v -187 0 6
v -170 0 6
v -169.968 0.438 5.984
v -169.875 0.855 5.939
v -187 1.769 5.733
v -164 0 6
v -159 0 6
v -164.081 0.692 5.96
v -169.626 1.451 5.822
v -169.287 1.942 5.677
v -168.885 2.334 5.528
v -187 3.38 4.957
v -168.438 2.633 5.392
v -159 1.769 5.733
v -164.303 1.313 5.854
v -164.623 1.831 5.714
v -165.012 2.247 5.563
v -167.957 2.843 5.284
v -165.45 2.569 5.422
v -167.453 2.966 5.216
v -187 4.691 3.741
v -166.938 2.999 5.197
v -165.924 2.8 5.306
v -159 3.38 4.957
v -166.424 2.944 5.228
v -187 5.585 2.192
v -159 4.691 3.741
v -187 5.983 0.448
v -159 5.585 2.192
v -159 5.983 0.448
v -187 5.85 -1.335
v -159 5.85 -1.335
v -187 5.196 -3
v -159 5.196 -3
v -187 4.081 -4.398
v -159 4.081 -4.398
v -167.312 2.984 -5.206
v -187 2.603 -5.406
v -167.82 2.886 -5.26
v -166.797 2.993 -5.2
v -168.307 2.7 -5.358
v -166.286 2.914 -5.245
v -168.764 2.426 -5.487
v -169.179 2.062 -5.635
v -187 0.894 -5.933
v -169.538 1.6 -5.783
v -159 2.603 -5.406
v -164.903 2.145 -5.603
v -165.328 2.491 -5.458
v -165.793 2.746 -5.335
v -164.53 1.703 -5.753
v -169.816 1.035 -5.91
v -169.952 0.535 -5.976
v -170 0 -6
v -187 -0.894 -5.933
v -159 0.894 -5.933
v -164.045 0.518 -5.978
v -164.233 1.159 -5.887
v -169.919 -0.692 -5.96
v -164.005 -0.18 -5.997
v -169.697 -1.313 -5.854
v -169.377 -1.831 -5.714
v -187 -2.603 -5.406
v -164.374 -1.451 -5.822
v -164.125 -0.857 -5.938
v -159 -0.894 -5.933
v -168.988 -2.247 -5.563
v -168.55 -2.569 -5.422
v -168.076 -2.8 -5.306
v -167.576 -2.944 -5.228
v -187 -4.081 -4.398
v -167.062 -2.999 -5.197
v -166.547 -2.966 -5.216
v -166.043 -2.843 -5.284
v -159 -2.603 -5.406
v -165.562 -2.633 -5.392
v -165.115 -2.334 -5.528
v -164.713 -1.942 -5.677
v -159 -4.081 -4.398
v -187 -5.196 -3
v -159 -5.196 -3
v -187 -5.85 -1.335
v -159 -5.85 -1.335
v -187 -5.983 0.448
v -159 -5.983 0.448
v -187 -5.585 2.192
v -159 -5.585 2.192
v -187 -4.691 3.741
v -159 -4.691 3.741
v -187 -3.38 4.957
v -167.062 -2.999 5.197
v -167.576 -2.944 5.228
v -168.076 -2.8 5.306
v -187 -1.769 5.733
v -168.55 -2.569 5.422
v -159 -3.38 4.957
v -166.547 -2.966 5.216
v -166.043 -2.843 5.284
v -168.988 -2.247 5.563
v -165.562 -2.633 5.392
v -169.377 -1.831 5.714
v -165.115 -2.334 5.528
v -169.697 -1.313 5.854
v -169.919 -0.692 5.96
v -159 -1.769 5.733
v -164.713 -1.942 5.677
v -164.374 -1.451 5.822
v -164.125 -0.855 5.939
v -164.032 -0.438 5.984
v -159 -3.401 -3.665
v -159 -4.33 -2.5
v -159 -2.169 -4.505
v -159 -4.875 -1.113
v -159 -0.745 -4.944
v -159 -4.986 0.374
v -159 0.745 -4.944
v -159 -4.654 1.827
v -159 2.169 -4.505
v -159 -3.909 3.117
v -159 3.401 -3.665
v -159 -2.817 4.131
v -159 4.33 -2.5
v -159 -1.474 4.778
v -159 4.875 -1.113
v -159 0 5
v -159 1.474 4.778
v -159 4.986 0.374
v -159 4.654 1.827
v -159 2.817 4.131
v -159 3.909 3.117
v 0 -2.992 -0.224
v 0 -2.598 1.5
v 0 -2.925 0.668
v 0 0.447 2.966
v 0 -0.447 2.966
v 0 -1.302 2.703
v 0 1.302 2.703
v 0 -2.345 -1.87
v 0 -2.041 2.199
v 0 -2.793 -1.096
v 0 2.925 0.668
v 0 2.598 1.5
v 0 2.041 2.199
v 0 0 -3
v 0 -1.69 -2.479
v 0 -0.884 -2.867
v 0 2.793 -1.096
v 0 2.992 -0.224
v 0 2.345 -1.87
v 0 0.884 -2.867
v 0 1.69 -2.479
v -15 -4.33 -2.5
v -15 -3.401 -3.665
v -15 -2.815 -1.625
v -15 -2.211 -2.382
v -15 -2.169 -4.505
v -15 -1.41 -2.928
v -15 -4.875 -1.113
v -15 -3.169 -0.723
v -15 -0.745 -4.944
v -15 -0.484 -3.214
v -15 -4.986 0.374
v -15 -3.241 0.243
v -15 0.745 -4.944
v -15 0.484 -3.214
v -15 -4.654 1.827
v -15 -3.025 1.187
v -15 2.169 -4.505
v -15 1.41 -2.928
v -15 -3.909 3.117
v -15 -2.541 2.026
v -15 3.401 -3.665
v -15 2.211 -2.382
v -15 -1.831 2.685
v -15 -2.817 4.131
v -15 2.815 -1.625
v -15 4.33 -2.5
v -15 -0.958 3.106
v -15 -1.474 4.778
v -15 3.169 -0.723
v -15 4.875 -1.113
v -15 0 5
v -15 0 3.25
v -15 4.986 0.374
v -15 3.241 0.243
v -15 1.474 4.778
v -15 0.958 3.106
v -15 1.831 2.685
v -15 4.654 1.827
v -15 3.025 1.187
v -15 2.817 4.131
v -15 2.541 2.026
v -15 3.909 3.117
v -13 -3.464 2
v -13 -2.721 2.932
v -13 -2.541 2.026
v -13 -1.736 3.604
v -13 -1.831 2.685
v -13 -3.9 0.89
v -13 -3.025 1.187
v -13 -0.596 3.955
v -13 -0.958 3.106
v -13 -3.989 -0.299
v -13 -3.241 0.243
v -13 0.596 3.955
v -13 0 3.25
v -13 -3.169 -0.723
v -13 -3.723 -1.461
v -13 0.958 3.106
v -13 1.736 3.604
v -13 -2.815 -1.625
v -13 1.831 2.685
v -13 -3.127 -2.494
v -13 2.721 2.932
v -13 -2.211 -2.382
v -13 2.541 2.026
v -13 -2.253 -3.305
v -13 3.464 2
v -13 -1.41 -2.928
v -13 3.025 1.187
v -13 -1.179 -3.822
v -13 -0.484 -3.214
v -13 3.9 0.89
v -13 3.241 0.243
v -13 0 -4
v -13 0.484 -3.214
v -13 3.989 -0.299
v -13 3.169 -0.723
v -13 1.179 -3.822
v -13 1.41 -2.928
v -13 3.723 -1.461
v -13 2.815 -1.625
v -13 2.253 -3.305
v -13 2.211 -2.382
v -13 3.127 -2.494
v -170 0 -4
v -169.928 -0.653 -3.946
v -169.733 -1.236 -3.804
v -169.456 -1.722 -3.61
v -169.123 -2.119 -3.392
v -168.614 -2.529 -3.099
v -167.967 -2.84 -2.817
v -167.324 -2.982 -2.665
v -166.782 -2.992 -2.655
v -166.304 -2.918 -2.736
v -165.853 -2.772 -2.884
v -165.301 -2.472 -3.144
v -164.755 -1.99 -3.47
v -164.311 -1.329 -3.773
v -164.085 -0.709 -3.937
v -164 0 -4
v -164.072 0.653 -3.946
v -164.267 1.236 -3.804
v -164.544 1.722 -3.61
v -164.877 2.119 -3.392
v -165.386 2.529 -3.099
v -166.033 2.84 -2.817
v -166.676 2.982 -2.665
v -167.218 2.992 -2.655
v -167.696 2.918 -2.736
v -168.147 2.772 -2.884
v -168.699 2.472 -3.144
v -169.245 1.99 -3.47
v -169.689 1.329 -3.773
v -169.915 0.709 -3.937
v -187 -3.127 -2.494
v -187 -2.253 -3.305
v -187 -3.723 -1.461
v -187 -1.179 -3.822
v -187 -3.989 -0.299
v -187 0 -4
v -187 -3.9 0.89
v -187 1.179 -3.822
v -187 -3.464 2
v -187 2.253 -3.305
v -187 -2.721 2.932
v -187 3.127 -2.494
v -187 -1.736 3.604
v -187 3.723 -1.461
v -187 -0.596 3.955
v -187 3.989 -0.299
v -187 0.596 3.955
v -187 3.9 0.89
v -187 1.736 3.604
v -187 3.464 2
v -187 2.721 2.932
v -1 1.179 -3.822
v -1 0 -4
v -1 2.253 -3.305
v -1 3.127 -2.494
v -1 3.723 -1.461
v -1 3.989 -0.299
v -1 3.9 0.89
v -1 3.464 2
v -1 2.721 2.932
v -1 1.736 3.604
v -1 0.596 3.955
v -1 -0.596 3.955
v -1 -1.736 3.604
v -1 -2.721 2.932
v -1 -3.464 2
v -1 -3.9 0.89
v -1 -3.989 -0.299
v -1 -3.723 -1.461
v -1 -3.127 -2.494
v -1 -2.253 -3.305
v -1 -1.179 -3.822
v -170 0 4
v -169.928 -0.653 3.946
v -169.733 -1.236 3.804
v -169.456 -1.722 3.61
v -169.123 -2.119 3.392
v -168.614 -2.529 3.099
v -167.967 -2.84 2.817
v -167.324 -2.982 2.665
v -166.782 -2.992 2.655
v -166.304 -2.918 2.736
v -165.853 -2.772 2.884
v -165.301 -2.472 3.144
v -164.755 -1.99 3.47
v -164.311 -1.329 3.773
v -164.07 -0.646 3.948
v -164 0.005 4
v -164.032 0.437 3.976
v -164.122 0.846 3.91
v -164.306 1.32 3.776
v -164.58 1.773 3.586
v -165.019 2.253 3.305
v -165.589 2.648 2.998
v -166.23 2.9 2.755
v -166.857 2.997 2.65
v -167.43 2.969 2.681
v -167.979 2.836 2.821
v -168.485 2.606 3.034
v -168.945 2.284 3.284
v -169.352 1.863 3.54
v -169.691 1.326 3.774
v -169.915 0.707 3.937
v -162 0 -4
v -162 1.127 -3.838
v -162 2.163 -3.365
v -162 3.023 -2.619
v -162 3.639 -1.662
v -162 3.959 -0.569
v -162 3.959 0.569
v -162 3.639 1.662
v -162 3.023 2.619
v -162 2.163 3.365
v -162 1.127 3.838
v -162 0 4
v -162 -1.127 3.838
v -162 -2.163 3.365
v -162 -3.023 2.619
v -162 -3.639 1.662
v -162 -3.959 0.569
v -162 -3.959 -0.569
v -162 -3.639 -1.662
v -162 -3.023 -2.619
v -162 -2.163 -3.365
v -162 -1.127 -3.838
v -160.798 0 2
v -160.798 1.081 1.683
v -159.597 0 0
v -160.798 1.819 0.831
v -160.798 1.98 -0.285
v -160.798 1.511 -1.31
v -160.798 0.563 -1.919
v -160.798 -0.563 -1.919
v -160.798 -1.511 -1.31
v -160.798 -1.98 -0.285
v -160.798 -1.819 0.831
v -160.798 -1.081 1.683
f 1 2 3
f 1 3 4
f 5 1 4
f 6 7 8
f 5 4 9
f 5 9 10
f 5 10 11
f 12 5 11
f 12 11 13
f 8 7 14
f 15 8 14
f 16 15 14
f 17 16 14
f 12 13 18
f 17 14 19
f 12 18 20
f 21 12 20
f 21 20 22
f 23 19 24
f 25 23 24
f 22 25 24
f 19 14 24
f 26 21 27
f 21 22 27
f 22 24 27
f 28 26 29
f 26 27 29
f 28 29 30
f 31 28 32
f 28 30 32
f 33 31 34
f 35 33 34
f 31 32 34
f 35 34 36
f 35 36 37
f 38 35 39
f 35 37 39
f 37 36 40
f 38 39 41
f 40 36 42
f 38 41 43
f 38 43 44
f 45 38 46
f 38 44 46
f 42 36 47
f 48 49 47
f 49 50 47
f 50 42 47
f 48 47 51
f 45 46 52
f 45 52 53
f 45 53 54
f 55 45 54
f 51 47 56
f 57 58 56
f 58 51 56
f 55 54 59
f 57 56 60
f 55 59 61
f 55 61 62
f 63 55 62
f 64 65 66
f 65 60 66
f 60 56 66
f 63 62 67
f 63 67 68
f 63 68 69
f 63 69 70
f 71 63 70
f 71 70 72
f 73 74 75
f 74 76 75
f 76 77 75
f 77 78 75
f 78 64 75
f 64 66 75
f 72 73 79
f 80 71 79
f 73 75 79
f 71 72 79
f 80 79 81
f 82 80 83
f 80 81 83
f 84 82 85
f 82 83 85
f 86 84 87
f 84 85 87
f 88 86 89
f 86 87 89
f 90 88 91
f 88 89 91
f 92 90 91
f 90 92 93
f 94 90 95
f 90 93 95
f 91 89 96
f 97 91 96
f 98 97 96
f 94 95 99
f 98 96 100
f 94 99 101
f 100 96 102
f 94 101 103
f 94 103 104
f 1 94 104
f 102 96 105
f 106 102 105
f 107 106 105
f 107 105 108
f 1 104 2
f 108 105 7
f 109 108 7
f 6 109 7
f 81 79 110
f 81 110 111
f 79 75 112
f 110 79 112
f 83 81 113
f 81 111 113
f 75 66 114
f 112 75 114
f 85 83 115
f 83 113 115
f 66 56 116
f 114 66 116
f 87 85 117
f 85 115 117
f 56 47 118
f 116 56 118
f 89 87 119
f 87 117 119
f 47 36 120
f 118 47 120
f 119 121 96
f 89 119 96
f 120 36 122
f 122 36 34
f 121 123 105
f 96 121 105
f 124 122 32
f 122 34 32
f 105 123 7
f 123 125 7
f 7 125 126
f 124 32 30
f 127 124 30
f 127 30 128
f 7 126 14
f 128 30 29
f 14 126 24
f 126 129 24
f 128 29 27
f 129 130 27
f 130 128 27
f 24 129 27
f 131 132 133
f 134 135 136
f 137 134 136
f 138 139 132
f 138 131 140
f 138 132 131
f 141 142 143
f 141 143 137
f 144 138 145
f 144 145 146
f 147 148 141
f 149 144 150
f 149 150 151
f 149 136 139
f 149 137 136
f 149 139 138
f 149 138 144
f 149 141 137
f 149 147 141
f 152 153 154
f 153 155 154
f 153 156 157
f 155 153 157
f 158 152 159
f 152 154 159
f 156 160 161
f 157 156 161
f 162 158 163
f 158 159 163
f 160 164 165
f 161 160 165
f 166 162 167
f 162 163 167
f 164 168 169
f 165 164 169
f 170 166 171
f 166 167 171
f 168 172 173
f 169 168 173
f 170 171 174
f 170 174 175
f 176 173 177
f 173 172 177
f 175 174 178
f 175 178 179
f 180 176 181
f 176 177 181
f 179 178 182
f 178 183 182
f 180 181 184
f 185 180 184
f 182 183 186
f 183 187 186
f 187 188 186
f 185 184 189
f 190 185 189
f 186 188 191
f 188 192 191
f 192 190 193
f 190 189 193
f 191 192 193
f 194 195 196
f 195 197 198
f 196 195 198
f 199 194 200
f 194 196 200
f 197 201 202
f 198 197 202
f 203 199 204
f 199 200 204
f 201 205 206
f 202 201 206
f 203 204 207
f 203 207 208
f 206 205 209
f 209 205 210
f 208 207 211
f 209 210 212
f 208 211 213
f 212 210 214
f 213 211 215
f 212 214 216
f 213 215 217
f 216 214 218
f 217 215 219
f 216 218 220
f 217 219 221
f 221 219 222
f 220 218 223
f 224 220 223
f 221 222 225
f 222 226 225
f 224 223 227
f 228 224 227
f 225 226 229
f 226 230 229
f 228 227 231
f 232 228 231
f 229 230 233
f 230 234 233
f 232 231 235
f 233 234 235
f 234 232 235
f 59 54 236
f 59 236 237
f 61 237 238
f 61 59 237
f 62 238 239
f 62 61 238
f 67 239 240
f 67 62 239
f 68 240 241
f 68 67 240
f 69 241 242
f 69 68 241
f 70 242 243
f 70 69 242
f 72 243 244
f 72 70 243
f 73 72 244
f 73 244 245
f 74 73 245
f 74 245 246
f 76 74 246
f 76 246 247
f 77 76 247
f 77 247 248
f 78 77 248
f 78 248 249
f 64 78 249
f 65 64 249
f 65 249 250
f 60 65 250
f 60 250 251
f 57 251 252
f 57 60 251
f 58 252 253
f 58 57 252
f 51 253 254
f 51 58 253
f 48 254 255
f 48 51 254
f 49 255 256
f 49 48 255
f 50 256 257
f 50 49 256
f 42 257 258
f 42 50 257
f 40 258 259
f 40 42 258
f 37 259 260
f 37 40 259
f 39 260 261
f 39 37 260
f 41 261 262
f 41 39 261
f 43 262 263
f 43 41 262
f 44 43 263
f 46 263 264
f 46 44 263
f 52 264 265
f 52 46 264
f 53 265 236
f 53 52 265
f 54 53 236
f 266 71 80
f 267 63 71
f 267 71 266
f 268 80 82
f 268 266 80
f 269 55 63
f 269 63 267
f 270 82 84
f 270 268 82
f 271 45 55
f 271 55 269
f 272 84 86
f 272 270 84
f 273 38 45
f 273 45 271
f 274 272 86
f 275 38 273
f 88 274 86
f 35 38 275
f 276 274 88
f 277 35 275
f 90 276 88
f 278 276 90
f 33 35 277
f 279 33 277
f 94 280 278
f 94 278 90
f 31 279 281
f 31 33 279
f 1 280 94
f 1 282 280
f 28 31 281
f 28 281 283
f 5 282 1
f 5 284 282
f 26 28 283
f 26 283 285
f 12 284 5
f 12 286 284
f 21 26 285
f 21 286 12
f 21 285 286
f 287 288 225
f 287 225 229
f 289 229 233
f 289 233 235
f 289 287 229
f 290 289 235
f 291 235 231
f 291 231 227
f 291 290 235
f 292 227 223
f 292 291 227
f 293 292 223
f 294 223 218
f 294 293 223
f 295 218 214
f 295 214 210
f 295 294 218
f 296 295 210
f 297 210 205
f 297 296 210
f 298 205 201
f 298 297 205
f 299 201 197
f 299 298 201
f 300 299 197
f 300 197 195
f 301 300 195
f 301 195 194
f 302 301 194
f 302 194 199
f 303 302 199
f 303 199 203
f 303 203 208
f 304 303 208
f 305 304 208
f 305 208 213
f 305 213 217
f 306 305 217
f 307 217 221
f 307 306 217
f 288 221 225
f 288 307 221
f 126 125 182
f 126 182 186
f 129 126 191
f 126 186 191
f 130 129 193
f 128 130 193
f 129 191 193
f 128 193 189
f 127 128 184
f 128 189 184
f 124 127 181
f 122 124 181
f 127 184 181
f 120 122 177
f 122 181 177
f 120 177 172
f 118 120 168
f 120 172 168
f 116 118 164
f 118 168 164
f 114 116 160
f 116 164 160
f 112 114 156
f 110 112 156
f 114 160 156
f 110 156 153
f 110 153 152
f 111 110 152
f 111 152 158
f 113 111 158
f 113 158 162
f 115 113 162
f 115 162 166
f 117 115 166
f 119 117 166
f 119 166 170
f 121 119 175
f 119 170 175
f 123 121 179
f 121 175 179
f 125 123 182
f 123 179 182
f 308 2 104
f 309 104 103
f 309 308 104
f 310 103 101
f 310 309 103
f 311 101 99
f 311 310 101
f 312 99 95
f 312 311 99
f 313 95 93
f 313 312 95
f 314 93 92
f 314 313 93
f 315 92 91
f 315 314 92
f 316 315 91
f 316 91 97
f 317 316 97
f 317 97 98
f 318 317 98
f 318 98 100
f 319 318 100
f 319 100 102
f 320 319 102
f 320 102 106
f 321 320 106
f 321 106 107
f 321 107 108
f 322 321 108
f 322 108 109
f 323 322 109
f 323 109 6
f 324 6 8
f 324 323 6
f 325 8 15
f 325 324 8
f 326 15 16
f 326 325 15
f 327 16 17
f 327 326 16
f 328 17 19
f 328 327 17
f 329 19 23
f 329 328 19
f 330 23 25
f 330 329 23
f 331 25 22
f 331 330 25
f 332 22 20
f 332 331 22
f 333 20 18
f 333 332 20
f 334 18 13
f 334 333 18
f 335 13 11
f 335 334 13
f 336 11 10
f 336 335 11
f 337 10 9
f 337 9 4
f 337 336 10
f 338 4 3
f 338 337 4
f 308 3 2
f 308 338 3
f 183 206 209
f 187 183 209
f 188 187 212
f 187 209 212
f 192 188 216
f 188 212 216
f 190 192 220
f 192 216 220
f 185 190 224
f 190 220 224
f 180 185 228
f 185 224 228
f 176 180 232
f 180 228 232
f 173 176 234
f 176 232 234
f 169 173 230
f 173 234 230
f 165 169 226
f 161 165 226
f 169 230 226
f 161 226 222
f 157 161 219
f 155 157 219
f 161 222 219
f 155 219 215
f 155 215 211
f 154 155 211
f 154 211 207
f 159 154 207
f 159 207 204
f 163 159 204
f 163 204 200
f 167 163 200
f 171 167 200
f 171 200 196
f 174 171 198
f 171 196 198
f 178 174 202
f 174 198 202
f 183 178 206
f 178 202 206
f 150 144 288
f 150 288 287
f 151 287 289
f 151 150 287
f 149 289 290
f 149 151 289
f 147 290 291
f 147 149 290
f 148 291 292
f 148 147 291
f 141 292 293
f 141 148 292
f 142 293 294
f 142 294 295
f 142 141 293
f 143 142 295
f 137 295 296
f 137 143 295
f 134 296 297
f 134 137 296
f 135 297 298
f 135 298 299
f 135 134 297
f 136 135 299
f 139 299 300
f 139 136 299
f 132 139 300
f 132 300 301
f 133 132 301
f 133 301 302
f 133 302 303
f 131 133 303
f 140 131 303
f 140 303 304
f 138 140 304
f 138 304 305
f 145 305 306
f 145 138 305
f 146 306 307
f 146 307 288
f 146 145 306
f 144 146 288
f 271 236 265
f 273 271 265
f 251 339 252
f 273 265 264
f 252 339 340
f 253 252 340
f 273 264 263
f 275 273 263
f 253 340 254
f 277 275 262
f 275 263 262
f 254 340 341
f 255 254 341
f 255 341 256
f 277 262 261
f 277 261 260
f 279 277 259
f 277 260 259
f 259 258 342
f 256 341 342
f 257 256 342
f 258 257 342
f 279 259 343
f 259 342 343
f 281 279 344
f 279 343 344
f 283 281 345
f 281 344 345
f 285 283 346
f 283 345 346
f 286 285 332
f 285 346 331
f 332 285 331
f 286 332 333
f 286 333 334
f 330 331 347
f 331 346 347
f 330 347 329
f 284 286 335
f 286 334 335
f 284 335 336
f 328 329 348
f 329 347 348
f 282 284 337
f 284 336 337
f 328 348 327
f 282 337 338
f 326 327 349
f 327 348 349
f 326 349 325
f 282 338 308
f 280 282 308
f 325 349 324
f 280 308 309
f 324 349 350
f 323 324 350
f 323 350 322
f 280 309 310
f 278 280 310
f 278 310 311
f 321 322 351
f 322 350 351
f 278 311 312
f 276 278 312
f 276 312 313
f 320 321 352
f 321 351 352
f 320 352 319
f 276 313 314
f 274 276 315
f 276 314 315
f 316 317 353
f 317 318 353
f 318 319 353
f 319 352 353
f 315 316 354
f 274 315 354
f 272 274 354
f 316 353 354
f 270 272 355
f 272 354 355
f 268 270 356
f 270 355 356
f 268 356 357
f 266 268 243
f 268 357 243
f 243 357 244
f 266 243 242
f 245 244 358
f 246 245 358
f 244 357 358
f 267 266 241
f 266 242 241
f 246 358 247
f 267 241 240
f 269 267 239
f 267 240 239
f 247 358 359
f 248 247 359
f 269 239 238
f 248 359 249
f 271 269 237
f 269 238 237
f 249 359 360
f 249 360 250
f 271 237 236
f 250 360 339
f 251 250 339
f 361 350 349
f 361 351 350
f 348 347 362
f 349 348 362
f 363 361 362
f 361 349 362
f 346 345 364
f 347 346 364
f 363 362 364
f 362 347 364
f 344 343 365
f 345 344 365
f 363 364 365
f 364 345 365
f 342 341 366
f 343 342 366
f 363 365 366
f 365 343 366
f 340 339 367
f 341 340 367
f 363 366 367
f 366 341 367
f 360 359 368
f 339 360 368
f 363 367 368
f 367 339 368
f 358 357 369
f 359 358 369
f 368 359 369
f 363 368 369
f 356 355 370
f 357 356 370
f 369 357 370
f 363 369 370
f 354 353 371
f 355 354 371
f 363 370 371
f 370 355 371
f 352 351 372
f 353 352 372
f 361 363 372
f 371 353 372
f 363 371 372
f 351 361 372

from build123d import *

# Parameters (mm, degrees)
SKETCH_3_R               = 4
EXTRUDE_1_DEPTH          = 13
SKETCH_5_R               = 3.25
EXTRUDE_2_DEPTH          = 2
SKETCH_6_R               = 5
EXTRUDE_3_DEPTH          = 144
CHAMFER_2_SIZE           = 1
SKETCH_69_R              = 6
EXTRUDE_4_DEPTH          = 28
HOLE_WIZARD_1_D          = 8
HOLE_WIZARD_1_DEPTH      = 25
HOLE_WIZARD_1_TIP        = 2.403442476
CUT_EXTRUDE_1_DEPTH      = 28
CUT_EXTRUDE_1_DEPTH_BACK = 28
SKETCH_70_R              = 3


with BuildPart() as part:
    # 草图3 → 凸台-拉伸1 (new body)
    with BuildSketch(Plane(origin=(0, 0, 0), x_dir=(0, 0, -1), z_dir=(1, 0, 0))):
        Circle(SKETCH_3_R)
    extrude(amount=-EXTRUDE_1_DEPTH)

    # 草图5 → 凸台-拉伸2 (add)
    with BuildSketch(Plane.ZY.offset(13)):
        Circle(SKETCH_5_R)
    extrude(amount=EXTRUDE_2_DEPTH)

    # 草图6 → 凸台-拉伸3 (add)
    with BuildSketch(Plane.ZY.offset(15)):
        Circle(SKETCH_6_R)
    extrude(amount=EXTRUDE_3_DEPTH)

    # 倒角2
    chamfer_2_edges = [part.edges().sort_by_distance(p)[0] for p in [
        (0, 0, 4),
    ]]
    chamfer(chamfer_2_edges, length=CHAMFER_2_SIZE)

    # 草图69 → 凸台-拉伸4 (add)
    with BuildSketch(Plane.ZY.offset(159)):
        Circle(SKETCH_69_R)
    extrude(amount=EXTRUDE_4_DEPTH)

    # 孔1
    with Locations(Plane.ZY.offset(187)):
        with Locations((0, 0)):
            Hole(HOLE_WIZARD_1_D / 2, depth=HOLE_WIZARD_1_DEPTH)
            with Locations((0, 0, -(HOLE_WIZARD_1_DEPTH + HOLE_WIZARD_1_TIP / 2))):  # 118° drill point
                Cone(0, HOLE_WIZARD_1_D / 2, HOLE_WIZARD_1_TIP, mode=Mode.SUBTRACT)

    # 草图70 → 切除-拉伸1 (cut, two sides: drawn at the far end of the back side and taken through both)
    with BuildSketch(Plane.XY.offset(-CUT_EXTRUDE_1_DEPTH_BACK)):
        with Locations((-167, 0)):
            Circle(SKETCH_70_R)
    extrude(amount=CUT_EXTRUDE_1_DEPTH + CUT_EXTRUDE_1_DEPTH_BACK, mode=Mode.SUBTRACT)


solid = part.part
